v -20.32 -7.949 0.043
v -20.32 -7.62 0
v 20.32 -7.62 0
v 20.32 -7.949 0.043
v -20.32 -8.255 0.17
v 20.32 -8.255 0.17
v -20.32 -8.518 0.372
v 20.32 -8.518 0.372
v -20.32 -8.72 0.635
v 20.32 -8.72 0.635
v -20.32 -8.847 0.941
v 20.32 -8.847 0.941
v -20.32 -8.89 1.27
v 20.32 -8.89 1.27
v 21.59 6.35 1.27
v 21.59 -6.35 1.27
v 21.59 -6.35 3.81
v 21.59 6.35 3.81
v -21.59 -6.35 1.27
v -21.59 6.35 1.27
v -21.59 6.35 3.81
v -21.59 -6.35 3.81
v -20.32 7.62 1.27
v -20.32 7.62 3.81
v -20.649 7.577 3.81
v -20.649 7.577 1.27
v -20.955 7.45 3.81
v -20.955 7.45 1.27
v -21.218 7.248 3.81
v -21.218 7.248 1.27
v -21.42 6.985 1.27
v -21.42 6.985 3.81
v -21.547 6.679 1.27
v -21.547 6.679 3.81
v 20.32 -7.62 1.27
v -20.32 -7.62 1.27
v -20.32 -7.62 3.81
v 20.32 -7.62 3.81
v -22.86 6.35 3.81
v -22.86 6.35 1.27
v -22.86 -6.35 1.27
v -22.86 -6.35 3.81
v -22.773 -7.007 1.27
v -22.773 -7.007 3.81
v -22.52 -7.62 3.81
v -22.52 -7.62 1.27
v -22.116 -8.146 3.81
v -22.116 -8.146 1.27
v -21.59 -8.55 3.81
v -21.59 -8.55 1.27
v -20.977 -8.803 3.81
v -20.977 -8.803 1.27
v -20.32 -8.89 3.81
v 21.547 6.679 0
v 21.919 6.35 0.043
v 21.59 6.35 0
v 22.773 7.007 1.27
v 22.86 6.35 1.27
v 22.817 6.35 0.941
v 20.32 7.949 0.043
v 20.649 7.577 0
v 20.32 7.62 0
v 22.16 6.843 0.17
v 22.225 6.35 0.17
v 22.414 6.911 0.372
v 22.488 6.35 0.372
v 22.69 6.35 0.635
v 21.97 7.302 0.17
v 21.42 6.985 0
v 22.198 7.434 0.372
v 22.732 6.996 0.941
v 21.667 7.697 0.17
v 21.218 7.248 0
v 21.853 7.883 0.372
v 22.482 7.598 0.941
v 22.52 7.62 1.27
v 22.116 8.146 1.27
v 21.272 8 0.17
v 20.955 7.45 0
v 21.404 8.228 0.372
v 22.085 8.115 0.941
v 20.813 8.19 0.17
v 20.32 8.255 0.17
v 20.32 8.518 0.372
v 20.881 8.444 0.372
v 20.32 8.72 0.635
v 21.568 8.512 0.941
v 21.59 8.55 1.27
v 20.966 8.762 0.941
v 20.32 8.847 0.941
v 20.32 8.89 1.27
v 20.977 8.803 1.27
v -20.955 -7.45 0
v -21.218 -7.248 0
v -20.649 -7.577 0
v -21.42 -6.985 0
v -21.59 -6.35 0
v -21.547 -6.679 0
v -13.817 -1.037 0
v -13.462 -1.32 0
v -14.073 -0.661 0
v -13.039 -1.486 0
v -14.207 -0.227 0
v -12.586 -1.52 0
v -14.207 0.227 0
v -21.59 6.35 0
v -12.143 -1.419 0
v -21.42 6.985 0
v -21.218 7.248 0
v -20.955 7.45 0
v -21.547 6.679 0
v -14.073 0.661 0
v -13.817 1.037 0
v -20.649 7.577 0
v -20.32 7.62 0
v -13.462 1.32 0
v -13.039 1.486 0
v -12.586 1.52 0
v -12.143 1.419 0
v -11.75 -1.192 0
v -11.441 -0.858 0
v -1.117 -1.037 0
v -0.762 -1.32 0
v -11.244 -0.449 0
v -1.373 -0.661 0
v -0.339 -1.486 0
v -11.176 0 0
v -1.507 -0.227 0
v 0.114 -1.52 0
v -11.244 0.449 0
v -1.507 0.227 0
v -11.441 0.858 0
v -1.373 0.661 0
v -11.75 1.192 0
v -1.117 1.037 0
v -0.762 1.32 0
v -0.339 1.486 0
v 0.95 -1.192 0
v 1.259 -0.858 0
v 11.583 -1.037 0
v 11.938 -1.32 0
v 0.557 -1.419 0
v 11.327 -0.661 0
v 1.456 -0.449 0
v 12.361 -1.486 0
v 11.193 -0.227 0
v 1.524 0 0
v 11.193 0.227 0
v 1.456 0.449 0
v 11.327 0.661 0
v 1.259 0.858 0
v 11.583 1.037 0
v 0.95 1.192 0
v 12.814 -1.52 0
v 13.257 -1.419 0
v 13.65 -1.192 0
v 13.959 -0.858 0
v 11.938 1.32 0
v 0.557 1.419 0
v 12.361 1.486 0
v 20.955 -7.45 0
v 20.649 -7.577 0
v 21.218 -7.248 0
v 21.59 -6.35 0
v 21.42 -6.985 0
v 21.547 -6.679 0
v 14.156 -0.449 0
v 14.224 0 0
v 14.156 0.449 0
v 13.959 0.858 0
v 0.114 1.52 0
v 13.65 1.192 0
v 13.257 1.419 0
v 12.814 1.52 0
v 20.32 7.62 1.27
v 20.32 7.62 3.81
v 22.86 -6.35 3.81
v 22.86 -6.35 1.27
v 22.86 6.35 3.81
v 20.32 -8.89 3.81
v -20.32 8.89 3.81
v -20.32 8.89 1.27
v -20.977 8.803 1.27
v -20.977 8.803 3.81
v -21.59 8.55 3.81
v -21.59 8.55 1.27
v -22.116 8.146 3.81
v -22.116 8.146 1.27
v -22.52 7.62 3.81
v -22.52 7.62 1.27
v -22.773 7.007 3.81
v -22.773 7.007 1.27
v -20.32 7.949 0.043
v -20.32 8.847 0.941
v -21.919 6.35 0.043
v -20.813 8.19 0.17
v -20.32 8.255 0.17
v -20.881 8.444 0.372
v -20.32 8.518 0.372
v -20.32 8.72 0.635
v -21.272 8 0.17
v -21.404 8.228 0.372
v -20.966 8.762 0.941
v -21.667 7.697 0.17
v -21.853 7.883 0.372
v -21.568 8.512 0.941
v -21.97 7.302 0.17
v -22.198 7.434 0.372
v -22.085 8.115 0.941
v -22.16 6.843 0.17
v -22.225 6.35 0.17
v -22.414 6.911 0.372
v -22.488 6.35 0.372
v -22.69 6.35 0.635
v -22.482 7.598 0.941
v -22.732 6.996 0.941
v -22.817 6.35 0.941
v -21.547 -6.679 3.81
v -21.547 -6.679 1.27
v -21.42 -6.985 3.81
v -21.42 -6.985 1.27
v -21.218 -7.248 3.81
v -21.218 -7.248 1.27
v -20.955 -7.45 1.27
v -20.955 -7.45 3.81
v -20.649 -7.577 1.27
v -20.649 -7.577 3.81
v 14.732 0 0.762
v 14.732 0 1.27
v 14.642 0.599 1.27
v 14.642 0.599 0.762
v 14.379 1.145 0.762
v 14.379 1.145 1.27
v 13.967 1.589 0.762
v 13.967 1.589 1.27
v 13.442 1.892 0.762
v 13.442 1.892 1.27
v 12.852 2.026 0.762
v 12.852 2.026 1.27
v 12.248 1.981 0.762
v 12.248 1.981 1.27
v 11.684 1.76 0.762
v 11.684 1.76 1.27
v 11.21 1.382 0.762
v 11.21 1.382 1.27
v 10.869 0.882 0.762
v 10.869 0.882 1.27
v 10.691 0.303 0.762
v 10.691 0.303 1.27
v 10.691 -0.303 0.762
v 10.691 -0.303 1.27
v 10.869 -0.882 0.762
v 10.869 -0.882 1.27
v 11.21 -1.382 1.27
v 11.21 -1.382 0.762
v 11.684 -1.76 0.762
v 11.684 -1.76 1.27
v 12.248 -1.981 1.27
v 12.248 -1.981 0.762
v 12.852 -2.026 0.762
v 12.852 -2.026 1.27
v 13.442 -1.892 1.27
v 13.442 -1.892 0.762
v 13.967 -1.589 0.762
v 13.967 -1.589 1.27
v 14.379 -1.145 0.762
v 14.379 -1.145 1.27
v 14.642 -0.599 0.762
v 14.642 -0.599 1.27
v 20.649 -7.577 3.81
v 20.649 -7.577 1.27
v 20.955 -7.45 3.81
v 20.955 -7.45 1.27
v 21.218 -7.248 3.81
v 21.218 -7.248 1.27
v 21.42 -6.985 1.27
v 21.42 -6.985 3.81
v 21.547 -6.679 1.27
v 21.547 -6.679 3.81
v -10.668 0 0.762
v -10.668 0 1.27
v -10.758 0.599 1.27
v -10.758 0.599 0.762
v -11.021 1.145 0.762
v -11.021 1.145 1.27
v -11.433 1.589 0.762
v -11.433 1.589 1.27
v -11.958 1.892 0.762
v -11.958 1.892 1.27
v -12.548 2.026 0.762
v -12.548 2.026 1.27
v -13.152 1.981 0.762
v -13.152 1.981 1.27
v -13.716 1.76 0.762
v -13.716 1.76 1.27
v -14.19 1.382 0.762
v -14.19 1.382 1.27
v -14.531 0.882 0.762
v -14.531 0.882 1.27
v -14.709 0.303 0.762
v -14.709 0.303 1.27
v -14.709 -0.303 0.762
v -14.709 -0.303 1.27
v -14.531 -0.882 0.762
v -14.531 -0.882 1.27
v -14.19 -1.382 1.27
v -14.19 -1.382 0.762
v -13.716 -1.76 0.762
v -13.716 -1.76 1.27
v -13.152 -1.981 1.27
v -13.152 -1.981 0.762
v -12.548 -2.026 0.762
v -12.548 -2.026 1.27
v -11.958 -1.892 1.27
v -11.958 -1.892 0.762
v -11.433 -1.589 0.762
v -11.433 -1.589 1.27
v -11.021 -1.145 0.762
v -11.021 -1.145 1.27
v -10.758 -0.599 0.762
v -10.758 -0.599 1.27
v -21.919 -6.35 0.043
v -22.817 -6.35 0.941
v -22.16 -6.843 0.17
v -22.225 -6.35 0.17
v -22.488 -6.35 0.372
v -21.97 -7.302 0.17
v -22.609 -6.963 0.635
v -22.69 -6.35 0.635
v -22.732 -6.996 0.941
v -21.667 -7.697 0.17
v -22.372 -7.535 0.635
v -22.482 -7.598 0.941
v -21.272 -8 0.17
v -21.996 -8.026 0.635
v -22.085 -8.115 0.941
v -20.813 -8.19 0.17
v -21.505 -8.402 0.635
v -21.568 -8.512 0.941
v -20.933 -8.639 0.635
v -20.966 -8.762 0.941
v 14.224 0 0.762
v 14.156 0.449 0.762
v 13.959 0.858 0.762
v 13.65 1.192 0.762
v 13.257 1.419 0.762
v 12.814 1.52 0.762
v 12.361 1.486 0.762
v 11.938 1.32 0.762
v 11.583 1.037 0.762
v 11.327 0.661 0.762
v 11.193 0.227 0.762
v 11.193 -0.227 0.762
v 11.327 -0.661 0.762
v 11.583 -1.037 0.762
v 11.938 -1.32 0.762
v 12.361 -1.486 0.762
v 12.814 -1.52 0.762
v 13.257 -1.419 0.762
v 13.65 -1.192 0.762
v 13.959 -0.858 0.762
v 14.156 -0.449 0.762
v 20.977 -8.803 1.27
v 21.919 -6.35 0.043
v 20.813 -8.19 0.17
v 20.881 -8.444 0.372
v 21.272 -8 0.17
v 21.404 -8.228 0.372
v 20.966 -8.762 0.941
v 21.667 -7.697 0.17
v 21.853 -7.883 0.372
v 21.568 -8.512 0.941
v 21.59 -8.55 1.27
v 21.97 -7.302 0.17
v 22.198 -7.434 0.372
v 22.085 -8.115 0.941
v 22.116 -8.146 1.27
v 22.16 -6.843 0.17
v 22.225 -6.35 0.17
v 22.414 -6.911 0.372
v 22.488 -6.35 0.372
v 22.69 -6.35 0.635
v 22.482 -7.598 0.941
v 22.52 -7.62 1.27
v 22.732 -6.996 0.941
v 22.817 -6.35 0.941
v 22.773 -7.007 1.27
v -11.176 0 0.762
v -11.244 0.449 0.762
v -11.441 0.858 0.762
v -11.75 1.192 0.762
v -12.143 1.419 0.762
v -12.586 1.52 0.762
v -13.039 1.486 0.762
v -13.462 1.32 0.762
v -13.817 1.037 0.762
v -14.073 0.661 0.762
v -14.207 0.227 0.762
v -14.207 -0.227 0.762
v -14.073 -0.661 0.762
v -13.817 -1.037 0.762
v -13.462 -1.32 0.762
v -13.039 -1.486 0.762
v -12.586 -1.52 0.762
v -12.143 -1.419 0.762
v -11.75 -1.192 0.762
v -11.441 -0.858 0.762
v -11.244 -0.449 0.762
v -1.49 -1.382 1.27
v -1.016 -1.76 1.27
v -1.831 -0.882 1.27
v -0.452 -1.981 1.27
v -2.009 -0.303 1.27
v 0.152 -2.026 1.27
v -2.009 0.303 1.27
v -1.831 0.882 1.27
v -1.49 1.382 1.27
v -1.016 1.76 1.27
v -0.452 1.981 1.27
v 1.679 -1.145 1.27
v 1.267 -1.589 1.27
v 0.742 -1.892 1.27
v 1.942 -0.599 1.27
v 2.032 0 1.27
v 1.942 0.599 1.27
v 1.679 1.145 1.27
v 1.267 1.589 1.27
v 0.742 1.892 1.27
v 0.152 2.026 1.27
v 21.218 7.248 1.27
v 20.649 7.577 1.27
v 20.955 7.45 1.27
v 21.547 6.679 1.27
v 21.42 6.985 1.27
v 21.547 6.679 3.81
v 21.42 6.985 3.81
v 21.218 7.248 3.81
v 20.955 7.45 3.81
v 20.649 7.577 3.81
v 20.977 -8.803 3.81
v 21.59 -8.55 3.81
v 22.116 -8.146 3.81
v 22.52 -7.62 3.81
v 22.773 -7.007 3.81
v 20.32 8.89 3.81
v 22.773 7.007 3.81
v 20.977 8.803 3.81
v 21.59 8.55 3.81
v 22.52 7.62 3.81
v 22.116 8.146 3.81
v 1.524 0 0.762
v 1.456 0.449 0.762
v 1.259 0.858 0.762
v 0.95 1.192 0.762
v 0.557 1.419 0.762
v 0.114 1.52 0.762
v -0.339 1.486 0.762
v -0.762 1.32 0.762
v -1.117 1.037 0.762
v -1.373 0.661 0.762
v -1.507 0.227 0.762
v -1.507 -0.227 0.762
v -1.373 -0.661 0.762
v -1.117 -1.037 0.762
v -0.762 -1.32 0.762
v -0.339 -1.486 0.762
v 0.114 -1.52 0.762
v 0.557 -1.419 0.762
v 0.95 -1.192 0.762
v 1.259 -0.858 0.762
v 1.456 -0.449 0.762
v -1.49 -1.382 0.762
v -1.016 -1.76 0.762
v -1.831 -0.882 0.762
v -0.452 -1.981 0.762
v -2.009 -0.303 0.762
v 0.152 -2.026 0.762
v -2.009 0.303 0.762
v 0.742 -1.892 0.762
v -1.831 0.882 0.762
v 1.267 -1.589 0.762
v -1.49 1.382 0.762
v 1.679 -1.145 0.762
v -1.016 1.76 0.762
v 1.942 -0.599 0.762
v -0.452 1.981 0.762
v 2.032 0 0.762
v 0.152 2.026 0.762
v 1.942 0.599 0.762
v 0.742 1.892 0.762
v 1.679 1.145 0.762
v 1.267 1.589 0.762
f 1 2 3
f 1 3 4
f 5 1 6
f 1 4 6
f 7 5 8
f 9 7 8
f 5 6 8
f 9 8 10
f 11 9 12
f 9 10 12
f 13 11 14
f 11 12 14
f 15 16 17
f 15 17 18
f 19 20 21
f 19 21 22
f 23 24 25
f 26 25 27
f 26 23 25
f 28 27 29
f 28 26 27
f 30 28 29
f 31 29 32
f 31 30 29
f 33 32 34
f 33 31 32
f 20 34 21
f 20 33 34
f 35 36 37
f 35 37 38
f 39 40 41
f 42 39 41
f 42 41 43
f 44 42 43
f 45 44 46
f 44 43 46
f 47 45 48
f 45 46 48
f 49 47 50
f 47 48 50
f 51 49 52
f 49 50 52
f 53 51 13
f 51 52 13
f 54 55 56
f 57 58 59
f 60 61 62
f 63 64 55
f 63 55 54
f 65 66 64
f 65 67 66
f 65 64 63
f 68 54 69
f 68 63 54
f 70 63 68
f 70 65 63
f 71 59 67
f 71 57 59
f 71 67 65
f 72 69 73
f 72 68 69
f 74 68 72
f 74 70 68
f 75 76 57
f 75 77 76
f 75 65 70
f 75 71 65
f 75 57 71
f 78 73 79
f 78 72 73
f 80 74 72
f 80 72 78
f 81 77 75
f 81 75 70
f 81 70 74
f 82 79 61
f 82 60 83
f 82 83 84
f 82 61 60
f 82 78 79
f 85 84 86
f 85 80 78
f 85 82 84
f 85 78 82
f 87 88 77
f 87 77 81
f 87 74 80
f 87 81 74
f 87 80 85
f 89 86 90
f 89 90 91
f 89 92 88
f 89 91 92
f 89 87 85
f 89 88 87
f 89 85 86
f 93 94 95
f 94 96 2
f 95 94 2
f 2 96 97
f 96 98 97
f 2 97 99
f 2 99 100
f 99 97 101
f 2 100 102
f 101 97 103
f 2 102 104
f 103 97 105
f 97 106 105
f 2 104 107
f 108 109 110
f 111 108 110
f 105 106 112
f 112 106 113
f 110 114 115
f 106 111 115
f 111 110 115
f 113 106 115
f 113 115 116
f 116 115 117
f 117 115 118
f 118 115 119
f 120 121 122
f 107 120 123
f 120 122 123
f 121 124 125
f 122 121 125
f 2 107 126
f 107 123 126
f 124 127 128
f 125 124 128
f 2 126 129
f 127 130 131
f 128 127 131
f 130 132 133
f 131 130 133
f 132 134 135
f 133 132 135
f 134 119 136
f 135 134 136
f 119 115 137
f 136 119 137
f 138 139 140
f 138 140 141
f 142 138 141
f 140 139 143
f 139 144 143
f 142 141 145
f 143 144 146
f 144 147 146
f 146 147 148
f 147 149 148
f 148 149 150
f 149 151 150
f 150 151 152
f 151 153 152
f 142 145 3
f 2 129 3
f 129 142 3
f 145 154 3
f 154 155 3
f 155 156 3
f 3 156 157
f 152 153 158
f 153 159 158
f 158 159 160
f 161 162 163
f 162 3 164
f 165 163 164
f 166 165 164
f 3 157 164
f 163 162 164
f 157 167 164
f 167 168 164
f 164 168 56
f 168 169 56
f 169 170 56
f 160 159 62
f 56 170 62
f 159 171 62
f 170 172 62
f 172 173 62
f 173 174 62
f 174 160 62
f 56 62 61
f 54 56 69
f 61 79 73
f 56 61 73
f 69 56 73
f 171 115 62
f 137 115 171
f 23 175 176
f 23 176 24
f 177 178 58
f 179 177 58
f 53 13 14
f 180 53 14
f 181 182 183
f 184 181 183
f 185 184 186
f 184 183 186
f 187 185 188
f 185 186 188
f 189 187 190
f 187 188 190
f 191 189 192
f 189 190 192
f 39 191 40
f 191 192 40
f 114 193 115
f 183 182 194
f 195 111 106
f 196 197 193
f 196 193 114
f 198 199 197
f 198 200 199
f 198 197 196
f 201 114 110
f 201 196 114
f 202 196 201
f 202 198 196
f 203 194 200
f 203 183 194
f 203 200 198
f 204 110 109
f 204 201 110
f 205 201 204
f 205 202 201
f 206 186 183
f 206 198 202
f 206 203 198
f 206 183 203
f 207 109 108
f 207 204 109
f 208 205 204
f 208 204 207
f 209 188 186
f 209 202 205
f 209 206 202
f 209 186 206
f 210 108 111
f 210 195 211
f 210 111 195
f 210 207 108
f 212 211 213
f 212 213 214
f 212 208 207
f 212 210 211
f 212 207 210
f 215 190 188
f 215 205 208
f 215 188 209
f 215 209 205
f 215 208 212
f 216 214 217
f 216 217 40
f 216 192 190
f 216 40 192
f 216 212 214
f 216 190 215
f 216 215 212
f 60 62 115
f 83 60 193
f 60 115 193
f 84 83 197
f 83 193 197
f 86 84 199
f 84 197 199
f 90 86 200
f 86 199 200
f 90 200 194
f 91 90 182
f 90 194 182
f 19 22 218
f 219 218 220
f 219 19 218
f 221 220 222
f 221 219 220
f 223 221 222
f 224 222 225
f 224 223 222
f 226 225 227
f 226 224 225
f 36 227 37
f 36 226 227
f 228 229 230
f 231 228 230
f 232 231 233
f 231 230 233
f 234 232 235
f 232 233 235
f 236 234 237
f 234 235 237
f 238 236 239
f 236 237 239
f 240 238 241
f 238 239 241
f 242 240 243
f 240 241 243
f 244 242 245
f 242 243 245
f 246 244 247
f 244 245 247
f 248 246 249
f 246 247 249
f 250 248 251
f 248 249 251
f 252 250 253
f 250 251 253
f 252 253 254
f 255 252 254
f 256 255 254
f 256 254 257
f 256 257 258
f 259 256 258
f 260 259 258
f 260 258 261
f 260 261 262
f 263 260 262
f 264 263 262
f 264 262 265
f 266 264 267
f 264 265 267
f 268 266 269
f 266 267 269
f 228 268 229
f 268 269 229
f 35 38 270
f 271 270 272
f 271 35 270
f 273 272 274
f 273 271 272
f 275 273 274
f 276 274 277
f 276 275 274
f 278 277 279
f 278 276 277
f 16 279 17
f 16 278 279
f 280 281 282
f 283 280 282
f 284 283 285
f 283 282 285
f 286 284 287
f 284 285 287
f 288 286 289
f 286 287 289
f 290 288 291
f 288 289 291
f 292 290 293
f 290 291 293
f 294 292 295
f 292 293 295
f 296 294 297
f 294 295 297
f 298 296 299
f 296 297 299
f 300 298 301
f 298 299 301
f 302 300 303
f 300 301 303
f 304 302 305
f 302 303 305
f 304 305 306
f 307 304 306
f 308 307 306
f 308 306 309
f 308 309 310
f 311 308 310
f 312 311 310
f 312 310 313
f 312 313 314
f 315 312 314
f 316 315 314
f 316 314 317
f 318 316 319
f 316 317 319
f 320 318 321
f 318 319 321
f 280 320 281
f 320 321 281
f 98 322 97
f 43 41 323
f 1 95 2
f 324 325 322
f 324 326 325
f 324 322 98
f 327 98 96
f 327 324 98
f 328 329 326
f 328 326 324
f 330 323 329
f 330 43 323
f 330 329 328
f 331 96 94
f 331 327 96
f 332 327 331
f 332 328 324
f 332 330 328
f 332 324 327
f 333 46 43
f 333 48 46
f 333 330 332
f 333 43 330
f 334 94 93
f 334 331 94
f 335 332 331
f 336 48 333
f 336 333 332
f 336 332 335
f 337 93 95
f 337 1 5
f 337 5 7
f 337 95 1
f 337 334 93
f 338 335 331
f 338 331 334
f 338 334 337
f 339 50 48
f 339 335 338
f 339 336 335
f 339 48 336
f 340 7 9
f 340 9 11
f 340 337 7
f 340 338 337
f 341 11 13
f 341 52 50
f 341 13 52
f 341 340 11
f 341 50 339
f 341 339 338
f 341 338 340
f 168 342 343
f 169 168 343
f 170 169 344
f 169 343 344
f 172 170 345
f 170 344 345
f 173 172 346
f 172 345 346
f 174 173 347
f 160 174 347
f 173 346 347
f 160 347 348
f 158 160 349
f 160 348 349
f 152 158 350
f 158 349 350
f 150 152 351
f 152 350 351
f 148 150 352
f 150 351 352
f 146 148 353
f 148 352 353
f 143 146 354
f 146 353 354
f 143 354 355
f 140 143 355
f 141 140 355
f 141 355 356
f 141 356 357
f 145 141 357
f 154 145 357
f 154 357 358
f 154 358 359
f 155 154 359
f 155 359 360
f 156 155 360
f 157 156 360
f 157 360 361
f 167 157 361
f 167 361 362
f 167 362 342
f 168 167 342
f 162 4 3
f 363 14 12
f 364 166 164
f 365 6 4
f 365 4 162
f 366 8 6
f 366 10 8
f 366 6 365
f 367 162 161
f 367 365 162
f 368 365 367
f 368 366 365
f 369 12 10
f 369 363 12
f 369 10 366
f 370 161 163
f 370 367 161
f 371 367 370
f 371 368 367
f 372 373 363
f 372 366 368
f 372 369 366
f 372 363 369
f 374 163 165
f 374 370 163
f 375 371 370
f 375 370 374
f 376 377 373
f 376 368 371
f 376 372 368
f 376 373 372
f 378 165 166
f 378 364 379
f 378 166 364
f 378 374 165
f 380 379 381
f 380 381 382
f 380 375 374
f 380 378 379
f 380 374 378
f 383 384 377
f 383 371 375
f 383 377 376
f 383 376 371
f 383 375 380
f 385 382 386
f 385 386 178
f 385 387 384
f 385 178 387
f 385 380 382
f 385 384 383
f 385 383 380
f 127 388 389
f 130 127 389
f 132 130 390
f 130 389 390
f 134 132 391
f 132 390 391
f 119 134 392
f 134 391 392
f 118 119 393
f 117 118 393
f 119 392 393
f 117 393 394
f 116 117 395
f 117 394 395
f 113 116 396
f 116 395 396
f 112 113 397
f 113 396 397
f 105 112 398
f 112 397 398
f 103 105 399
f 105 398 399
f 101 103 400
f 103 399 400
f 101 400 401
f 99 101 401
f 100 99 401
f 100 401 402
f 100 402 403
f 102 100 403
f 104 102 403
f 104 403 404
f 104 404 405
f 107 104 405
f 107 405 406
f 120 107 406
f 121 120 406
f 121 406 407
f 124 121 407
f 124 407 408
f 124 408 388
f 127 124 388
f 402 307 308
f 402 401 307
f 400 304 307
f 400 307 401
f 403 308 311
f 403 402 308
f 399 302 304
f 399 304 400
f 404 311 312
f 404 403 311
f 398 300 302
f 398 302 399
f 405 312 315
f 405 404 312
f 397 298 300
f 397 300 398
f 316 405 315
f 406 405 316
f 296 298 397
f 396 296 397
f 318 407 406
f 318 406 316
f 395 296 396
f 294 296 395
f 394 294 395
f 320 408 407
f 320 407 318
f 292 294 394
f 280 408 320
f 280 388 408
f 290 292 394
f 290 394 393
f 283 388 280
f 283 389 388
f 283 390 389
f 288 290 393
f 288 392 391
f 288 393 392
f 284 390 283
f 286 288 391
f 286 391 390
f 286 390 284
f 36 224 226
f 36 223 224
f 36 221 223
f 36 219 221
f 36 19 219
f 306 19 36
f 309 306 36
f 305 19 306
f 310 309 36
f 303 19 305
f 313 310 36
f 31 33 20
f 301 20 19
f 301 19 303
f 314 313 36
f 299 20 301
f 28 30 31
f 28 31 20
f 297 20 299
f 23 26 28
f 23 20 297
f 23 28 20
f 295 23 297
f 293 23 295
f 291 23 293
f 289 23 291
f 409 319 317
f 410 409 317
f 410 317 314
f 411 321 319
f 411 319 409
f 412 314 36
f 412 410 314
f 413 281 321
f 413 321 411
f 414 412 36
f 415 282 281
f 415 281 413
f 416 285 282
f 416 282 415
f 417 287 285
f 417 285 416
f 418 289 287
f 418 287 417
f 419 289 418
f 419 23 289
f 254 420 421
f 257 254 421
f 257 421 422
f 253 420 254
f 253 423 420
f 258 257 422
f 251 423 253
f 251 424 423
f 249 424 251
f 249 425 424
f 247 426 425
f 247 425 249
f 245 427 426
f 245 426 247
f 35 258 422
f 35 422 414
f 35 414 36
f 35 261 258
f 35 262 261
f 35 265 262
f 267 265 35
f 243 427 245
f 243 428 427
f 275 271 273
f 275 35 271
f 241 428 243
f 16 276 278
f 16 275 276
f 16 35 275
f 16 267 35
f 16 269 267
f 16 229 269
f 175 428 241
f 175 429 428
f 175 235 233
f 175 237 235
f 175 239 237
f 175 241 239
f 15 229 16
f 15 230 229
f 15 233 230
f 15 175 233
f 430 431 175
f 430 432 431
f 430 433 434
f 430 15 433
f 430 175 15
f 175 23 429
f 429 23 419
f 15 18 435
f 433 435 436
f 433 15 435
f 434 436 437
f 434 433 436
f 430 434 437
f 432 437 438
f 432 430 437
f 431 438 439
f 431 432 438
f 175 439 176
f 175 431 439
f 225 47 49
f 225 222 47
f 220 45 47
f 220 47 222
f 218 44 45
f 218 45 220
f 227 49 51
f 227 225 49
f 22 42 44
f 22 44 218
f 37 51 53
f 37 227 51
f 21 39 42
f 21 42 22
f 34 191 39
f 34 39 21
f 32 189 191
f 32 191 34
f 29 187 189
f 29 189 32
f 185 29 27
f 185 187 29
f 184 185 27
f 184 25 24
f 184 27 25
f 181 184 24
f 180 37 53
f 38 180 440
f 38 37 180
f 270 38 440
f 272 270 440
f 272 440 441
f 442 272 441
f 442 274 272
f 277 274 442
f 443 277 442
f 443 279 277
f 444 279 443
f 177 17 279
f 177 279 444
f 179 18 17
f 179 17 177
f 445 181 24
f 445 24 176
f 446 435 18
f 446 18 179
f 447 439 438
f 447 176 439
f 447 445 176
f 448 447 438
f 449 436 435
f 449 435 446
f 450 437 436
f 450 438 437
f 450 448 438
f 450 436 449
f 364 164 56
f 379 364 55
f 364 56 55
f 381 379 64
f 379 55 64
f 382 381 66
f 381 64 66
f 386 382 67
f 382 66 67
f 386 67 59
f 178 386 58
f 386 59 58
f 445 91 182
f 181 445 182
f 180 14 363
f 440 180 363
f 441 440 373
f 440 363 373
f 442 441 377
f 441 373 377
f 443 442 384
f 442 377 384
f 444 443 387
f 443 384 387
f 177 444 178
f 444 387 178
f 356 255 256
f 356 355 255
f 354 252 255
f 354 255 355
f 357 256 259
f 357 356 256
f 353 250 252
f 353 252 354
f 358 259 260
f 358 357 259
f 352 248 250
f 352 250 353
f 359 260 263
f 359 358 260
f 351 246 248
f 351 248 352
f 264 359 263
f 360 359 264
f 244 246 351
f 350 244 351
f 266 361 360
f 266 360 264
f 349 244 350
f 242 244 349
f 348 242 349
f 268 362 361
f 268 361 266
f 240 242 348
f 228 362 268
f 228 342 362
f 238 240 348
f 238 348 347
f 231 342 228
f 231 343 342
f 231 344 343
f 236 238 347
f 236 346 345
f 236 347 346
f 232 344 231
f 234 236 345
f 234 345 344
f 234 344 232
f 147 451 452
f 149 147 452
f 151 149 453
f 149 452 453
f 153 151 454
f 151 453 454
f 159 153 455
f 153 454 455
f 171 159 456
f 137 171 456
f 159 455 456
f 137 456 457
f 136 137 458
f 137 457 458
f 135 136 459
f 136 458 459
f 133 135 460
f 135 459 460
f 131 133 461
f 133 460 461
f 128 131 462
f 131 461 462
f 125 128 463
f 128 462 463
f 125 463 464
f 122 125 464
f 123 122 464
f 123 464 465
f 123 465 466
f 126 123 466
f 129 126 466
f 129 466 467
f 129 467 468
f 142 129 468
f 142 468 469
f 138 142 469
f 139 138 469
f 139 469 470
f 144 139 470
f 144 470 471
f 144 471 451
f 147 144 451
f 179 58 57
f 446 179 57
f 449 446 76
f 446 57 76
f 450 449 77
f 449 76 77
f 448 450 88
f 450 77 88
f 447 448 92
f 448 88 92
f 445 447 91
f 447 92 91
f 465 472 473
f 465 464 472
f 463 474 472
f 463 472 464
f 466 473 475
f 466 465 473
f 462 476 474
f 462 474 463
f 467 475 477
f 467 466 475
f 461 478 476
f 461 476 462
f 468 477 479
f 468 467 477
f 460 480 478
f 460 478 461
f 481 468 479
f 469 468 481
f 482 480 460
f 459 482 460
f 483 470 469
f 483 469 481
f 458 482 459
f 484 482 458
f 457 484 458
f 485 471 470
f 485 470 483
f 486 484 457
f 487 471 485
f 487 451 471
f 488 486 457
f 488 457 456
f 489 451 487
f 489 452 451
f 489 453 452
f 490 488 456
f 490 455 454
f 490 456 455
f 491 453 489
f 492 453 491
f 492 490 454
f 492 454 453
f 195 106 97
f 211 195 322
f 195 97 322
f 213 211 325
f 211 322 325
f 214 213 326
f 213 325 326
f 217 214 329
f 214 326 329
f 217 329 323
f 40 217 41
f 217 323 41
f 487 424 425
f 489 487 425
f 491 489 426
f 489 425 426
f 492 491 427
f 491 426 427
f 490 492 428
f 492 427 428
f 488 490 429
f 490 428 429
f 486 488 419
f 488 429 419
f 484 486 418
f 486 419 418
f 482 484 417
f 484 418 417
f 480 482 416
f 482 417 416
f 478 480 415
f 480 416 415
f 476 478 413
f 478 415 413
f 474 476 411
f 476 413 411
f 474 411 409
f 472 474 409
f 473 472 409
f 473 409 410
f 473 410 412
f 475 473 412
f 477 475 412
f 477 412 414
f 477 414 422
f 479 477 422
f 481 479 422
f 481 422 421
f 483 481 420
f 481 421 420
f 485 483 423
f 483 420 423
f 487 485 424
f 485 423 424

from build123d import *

# Parameters (mm, degrees)
F1_DEPTH = 3.81
F2_T     = -1.27
F3_R     = 1.524
F4_DEPTH = 25.4
F5_R     = 2.032
F6_DEPTH = 0.508
F7_R     = 1.27


with BuildPart() as f1:
    # F0 (on Top) → F1 (new body)
    with BuildSketch(Plane.XY):
        with BuildLine():
            ThreePointArc((22.86, 6.35), (22.116051, 8.146051), (20.32, 8.89))
            Line((20.32, 8.89), (-20.32, 8.89))
            ThreePointArc((-20.32, 8.89), (-22.116051, 8.146051), (-22.86, 6.35))
            Line((-22.86, 6.35), (-22.86, -6.35))
            ThreePointArc((-22.86, -6.35), (-22.116051, -8.146051), (-20.32, -8.89))
            Line((-20.32, -8.89), (20.32, -8.89))
            ThreePointArc((20.32, -8.89), (22.116051, -8.146051), (22.86, -6.35))
            Line((22.86, -6.35), (22.86, 6.35))
        make_face()
    extrude(amount=F1_DEPTH)

    # F2
    f2_openings = [f1.faces().sort_by_distance(p)[0] for p in [
        (0, 0, 3.81),
    ]]
    offset(amount=F2_T, openings=f2_openings)

    # F3 (on face) → F4 (cut)
    with BuildSketch(Plane.XY.offset(1.27)):
        with Locations((-12.7, 0)):
            Circle(F3_R)
        with Locations((-12.7, 50.8)):
            Circle(F3_R)
        Circle(F3_R)
        with Locations((0, 50.8)):
            Circle(F3_R)
        with Locations((12.7, 0)):
            Circle(F3_R)
        with Locations((12.7, 50.8)):
            Circle(F3_R)
    extrude(amount=-F4_DEPTH, mode=Mode.SUBTRACT)

    # F5 (on face) → F6 (cut)
    with BuildSketch(Plane.XY.offset(1.27)):
        with Locations((-12.7, 0)):
            Circle(F5_R)
        Circle(F5_R)
        with Locations((12.7, 0)):
            Circle(F5_R)
    extrude(amount=-F6_DEPTH, mode=Mode.SUBTRACT)

    # F7
    f7_edges = [f1.edges().sort_by_distance(p)[0] for p in [
        (0, -8.89, 0),
    ]]
    fillet(f7_edges, radius=F7_R)


solid = f1.part
